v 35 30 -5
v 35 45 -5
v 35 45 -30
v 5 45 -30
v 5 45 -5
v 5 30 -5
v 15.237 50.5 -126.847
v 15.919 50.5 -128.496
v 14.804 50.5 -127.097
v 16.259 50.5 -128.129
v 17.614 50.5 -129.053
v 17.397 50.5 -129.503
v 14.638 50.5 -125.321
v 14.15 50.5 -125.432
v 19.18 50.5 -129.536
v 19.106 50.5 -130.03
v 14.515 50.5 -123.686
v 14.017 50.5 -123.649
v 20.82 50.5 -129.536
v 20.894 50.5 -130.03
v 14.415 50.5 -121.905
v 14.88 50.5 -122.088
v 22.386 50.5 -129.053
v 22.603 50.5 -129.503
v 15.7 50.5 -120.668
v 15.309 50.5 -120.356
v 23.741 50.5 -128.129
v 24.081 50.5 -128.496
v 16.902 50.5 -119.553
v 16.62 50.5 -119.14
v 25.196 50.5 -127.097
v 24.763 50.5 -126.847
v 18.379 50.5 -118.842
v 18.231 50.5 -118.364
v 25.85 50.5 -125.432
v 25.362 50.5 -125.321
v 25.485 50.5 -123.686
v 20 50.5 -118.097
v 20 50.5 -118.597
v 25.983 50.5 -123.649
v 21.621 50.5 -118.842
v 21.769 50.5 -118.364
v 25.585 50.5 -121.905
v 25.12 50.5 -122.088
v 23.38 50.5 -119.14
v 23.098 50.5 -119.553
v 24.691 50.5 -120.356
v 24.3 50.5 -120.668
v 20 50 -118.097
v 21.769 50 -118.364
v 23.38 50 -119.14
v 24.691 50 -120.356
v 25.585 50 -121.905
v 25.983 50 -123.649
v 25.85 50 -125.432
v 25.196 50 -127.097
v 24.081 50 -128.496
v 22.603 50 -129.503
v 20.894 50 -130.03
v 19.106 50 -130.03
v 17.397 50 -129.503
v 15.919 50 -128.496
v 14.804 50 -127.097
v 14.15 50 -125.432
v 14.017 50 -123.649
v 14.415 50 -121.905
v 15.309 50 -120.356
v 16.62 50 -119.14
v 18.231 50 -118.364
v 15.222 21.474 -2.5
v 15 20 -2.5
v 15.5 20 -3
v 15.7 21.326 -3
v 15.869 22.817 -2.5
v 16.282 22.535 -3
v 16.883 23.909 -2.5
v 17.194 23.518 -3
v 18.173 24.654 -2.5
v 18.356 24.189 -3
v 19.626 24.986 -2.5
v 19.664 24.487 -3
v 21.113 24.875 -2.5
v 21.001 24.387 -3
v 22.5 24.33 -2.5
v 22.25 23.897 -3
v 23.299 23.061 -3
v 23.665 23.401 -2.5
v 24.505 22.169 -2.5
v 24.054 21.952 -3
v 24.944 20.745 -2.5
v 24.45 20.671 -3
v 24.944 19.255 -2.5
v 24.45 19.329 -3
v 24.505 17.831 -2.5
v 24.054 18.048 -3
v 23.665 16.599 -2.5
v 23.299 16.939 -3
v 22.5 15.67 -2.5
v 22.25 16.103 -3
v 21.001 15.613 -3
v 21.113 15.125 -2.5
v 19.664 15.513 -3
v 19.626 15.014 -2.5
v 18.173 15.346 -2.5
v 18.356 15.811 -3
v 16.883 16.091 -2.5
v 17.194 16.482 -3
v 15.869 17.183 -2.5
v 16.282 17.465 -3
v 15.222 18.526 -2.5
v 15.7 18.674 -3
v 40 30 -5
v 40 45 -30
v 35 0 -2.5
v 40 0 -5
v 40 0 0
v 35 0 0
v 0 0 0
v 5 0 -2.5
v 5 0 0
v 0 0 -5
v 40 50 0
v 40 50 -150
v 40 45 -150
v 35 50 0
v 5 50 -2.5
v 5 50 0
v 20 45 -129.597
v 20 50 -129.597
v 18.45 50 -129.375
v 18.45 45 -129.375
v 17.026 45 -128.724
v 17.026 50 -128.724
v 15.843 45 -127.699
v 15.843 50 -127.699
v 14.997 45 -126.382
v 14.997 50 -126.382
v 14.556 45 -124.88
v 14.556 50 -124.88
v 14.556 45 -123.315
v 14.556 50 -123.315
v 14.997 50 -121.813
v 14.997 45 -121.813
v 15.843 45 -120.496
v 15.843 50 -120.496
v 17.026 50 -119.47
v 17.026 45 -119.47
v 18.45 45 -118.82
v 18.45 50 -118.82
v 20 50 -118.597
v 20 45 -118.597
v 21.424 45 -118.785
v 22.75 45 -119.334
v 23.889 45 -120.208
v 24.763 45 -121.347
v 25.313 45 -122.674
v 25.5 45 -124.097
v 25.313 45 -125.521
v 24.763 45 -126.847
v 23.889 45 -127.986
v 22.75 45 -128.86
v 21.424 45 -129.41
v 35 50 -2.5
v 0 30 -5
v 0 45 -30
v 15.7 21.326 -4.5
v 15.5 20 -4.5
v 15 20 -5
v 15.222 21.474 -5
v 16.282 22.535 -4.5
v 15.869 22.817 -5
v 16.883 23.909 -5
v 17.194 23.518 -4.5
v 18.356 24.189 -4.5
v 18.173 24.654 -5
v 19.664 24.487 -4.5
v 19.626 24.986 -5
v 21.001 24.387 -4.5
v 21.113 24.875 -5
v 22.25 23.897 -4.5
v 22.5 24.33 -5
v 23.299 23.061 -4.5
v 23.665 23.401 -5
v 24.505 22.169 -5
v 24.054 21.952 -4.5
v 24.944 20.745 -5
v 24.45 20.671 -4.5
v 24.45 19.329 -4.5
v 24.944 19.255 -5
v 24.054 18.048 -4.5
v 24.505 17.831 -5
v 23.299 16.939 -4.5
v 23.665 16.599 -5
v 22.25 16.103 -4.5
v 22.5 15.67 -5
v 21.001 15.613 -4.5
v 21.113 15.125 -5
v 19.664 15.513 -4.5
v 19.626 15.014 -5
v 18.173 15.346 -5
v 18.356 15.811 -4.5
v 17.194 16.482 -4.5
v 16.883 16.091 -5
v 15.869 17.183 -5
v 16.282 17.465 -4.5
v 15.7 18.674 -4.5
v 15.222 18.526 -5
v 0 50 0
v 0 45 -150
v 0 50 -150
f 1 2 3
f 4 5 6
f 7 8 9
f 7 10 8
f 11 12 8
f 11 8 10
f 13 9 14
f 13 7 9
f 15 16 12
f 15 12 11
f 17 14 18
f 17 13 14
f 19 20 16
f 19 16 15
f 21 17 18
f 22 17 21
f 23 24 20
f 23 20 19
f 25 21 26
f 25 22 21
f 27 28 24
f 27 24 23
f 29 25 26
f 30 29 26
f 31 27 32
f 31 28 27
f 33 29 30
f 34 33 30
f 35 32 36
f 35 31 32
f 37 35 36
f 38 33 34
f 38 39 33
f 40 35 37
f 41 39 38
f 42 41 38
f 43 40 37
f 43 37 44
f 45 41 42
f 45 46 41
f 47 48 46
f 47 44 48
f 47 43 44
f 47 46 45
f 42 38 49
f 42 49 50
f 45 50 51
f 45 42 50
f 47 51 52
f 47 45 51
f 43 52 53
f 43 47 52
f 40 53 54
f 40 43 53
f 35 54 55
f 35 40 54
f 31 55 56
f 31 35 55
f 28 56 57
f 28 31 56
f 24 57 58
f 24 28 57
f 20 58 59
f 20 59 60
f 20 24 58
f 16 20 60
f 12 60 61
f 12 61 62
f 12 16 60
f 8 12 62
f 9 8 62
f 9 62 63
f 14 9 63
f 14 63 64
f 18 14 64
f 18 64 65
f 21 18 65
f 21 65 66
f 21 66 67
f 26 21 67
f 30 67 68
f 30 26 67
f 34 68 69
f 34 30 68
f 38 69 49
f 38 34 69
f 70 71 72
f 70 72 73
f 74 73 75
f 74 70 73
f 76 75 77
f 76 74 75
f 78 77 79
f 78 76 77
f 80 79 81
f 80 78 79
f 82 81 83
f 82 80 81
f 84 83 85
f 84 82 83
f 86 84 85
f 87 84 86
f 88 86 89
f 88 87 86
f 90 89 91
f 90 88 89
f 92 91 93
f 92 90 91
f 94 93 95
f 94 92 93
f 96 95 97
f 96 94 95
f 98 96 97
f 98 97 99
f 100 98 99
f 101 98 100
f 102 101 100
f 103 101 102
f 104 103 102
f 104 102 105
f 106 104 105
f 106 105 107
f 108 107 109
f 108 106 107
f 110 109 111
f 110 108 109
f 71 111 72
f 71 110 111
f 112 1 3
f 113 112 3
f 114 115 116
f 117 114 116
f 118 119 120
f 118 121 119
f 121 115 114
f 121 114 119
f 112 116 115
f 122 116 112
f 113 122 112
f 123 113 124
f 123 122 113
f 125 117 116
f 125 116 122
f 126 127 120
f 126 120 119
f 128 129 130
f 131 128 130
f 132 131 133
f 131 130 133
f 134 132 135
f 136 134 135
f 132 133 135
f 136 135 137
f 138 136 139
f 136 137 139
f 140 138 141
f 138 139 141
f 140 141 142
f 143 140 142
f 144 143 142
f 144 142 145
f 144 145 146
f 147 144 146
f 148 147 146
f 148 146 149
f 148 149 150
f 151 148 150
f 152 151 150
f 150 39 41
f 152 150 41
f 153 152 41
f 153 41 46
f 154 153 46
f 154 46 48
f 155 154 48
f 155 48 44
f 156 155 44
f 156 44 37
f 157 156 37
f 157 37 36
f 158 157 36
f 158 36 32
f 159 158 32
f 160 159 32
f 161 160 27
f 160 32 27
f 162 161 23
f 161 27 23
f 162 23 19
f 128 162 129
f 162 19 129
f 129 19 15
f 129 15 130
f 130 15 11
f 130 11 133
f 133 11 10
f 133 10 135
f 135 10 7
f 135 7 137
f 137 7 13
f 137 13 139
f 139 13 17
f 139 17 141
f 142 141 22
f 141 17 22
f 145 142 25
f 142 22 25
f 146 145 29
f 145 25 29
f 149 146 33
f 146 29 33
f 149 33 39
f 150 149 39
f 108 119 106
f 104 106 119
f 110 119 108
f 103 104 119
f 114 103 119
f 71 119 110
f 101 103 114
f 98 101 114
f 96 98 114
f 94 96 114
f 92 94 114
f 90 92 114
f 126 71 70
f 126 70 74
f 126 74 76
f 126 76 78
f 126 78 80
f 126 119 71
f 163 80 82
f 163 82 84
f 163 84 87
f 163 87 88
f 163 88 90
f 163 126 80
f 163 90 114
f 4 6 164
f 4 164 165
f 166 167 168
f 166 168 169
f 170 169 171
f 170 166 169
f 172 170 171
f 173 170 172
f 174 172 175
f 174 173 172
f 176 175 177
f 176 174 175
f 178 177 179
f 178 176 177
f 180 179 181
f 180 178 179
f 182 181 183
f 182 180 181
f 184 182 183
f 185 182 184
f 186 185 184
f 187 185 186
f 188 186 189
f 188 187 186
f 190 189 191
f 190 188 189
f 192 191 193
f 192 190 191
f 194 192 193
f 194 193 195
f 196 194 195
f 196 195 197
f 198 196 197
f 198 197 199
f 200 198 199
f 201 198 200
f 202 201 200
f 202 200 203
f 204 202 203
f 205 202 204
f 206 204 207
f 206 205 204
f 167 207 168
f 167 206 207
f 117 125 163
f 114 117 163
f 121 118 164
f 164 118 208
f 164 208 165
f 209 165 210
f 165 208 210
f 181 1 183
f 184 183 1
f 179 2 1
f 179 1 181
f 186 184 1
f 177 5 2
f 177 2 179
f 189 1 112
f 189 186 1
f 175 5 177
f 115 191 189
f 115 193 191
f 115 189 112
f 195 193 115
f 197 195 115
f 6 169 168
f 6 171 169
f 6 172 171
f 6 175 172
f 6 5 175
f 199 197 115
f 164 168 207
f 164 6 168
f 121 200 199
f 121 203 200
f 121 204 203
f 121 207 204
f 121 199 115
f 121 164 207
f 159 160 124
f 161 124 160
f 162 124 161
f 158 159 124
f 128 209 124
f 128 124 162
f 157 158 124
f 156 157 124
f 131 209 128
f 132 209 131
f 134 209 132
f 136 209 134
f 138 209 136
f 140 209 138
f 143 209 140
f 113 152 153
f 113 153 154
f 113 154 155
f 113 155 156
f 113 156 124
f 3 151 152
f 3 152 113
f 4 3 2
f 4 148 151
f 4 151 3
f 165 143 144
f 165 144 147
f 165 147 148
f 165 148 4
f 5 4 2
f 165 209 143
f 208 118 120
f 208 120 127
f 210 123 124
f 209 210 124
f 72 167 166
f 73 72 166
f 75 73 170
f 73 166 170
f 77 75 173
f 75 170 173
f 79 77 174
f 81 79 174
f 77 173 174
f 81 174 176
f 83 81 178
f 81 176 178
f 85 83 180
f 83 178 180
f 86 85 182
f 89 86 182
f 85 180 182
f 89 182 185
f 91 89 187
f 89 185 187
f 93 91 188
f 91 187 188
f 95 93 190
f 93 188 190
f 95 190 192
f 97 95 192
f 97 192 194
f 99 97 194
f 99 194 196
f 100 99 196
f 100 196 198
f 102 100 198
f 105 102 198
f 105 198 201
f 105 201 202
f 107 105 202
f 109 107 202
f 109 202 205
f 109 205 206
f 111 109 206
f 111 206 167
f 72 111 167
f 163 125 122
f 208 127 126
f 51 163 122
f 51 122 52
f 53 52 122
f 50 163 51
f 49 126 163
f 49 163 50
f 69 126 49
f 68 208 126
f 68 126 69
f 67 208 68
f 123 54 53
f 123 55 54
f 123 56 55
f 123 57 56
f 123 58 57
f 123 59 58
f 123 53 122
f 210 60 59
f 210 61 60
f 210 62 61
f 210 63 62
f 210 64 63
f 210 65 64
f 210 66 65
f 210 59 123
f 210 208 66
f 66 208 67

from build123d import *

# Parameters (mm, degrees)
DODANIE_WYCI_GNI_CIE1_DEPTH = 40
SZKIC2_W                    = 30
SZKIC2_H                    = 2.5
WYTNIJ_WYCI_GNI_CIE1_DEPTH  = 164.095064303
EBRO3_START                 = -5
EBRO3_DEPTH                 = 5
SZKIC4_R                    = 4.5
WYTNIJ_WYCI_GNI_CIE2_DEPTH  = 10
SFAZOWANIE1_SIZE            = 0.5
WYTNIJ_WYCI_GNI_CIE3_DEPTH  = 10
DODANIE_WYCI_GNI_CIE2_START = 0.5
SZKIC6_R                    = 6
SZKIC6_R_2                  = 5.5
DODANIE_WYCI_GNI_CIE2_DEPTH = 0.5


# Read off the part's stored shape, not the designer's step: Żebro3
with BuildPart() as part:
    # Szkic1 → Dodanie-wyciągnięcie1 (new body)
    with BuildSketch(Plane(origin=(0, 0, 0), x_dir=(0, 0, -1), z_dir=(1, 0, 0))):
        Polygon((0, 0), (0, 50), (150, 50), (150, 45), (5, 45), (5, 0), align=None)
    extrude(amount=DODANIE_WYCI_GNI_CIE1_DEPTH)

    # Szkic2 → Wytnij-wyciągnięcie1 (cut, through all)
    with BuildSketch(Plane(origin=(0, 50, 0), x_dir=(1, 0, 0), z_dir=(0, 1, 0))):
        with Locations((20, 1.25)):
            Rectangle(SZKIC2_W, SZKIC2_H)
    extrude(amount=-WYTNIJ_WYCI_GNI_CIE1_DEPTH, mode=Mode.SUBTRACT)

    # Żebro3 outline → Żebro3 (add)
    with BuildSketch(Plane(origin=(40, 0, 0), x_dir=(0, 0, -1), z_dir=(1, 0, 0)).offset(EBRO3_START)):
        Polygon((5, 30), (30, 45), (5, 45), align=None)
    ebro3 = extrude(amount=EBRO3_DEPTH)

    # Lustro1: Żebro3 across plane
    add(ebro3.mirror(Plane(origin=(20, 0, 0), x_dir=(0, 0, 1), z_dir=(1, 0, 0))))

    # Szkic4 → Wytnij-wyciągnięcie2 (cut)
    with BuildSketch(Plane(origin=(0, 0, -5), x_dir=(-1, 0, 0), z_dir=(0, 0, -1))):
        with Locations((-20, 20)):
            Circle(SZKIC4_R)
    extrude(amount=-WYTNIJ_WYCI_GNI_CIE2_DEPTH, mode=Mode.SUBTRACT)

    # Sfazowanie1
    sfazowanie1_edges = [part.edges().sort_by_distance(p)[0] for p in [
        (24.5, 20, -2.5),
        (24.5, 20, -5),
    ]]
    chamfer(sfazowanie1_edges, length=SFAZOWANIE1_SIZE)

    # Szkic5 → Wytnij-wyciągnięcie3 (cut)
    with BuildSketch(Plane(origin=(0, 50, 0), x_dir=(1, 0, 0), z_dir=(0, 1, 0))):
        with BuildLine():
            ThreePointArc((20, 129.597336258), (14.5, 124.097336258), (20, 118.597336258))
            Line((20, 118.597336258), (20, 129.597336258))
        make_face()
        with BuildLine():
            Line((20, 129.597336258), (20, 118.597336258))
            ThreePointArc((20, 118.597336258), (23.889087297, 120.208248962), (25.5, 124.097336258))
            ThreePointArc((25.5, 124.097336258), (23.889087297, 127.986423555), (20, 129.597336258))
        make_face()
    extrude(amount=-WYTNIJ_WYCI_GNI_CIE3_DEPTH, mode=Mode.SUBTRACT)

    # Szkic6 → Dodanie-wyciągnięcie2 (add)
    with BuildSketch(Plane(origin=(0, 50, 0), x_dir=(1, 0, 0), z_dir=(0, 1, 0)).offset(DODANIE_WYCI_GNI_CIE2_START)):
        with Locations(Location((20, 124.097336258, 0), (0, 0, 270))):
            Circle(SZKIC6_R)
        with Locations(Location((20, 124.097336258, 0), (0, 0, 270))):
            Circle(SZKIC6_R_2, mode=Mode.SUBTRACT)
    extrude(amount=-DODANIE_WYCI_GNI_CIE2_DEPTH)


solid = part.part
